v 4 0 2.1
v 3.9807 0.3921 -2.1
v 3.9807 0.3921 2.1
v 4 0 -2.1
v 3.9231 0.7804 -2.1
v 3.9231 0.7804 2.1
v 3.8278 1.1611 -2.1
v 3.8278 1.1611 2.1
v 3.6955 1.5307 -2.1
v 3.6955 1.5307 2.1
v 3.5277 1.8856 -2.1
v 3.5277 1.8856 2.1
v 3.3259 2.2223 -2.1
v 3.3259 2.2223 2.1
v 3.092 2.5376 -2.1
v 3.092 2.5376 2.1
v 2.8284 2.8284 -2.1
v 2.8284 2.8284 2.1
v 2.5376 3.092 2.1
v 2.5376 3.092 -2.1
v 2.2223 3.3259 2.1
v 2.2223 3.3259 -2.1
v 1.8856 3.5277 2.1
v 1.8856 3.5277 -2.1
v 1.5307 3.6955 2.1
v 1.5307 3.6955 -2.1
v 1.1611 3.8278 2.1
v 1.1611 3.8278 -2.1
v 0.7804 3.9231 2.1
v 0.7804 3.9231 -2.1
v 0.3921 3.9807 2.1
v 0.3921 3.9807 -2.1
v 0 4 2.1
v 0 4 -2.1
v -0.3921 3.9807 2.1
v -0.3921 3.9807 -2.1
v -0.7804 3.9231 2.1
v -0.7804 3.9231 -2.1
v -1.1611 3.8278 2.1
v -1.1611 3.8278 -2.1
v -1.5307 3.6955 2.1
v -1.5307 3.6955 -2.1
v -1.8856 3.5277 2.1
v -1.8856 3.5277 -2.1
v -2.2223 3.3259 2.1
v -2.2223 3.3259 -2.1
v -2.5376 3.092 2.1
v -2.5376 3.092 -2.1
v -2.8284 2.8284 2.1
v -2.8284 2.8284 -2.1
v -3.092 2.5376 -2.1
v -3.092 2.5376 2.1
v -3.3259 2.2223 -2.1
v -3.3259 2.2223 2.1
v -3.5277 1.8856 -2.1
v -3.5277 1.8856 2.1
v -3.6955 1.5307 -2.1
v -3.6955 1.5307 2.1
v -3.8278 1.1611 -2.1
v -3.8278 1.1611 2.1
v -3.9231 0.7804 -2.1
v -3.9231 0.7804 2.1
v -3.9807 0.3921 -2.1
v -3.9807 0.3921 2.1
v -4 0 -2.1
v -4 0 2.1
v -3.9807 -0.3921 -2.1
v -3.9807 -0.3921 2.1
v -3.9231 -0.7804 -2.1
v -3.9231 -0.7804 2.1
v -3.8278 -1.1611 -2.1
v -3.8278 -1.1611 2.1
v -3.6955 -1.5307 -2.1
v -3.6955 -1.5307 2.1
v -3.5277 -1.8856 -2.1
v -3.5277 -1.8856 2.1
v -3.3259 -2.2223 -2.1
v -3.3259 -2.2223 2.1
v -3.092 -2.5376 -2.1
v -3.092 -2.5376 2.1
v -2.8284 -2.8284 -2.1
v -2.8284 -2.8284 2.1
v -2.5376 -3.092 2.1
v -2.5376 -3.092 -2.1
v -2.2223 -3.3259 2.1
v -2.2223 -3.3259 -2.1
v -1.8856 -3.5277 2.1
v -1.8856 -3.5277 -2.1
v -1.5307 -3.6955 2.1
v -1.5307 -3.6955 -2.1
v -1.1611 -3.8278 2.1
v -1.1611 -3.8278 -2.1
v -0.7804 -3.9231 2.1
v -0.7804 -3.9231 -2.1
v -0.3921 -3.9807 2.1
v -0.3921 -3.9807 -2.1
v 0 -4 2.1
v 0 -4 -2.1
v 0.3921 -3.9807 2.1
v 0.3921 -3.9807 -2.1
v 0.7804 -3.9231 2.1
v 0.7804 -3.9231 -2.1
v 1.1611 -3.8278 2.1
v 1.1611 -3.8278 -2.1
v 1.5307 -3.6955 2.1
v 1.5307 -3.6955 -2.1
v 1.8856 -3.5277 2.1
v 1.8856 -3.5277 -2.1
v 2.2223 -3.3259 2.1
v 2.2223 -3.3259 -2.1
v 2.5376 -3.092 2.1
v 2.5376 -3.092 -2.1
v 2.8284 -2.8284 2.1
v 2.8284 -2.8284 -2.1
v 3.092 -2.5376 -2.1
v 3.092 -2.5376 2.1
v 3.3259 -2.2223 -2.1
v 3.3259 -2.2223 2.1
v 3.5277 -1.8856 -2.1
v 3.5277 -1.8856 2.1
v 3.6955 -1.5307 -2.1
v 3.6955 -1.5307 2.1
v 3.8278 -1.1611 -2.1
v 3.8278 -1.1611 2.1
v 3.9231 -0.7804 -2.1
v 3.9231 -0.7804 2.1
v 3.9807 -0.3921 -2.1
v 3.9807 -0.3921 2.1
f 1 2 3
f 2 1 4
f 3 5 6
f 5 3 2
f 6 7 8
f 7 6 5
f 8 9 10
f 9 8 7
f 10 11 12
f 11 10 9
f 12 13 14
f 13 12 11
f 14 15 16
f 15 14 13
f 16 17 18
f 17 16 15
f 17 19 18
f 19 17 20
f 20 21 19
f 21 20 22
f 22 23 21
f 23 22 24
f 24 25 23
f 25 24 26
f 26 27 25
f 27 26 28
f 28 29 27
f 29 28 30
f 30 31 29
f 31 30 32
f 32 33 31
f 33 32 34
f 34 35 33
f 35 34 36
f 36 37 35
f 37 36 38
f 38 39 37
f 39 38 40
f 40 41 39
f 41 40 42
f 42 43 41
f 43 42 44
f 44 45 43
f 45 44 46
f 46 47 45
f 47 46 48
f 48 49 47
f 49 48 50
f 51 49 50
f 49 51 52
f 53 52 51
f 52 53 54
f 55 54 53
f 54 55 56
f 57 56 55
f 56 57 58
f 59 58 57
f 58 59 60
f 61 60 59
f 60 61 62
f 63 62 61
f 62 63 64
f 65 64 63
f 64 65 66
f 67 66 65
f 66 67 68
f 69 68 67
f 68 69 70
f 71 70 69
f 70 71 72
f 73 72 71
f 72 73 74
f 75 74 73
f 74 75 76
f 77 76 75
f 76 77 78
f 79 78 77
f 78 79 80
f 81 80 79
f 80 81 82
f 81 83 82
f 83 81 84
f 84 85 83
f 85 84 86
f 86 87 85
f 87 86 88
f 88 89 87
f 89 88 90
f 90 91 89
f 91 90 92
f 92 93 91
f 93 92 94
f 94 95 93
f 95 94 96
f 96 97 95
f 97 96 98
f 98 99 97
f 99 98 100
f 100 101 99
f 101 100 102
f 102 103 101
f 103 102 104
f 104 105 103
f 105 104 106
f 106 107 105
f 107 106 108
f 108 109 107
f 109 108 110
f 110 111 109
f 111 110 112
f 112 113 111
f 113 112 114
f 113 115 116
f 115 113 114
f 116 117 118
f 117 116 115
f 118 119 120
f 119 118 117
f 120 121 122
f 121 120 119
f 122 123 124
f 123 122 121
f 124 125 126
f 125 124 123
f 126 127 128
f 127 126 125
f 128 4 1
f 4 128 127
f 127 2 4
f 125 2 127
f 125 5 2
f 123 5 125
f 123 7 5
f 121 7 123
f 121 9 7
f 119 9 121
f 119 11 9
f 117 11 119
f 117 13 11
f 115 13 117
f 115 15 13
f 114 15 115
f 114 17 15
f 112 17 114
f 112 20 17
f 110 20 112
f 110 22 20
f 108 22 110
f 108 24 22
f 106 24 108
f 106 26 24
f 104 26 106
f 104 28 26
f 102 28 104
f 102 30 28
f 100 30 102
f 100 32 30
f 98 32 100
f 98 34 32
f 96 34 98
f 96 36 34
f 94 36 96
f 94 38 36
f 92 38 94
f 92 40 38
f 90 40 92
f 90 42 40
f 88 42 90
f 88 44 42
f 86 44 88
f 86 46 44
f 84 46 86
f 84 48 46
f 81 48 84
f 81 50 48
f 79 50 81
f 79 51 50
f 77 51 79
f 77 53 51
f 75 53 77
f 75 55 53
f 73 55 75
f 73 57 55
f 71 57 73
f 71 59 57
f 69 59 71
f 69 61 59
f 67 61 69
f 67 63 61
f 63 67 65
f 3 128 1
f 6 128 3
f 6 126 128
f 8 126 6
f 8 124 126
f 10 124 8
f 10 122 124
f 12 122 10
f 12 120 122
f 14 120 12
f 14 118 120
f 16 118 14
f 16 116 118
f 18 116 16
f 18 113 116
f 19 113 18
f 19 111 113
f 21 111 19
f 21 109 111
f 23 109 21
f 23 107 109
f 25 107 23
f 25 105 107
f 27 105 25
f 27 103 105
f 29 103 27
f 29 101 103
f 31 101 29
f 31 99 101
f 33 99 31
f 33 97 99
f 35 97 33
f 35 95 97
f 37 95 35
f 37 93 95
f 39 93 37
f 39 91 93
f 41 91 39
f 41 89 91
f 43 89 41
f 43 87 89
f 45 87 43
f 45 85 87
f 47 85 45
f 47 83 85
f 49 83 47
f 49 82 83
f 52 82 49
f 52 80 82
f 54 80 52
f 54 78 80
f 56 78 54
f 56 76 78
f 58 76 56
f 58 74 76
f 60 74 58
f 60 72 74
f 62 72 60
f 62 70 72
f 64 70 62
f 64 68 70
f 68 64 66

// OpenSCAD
// Parameters
outer_diameter_mm = 8.0; //[4.0:16.0:0.1]
height_mm = 4.2; //[2.1:8.4:0.1]

// Magnet - complete geometry
module magnet() {
  color([0.72, 0.45, 0.2]) { // Copper-like color for magnet
    // Magnet body
    translate([0, 0, 0])
      cylinder(r=outer_diameter_mm/2, h=height_mm, center=true, $fn=64);
  }
}

// Assembly
module assembly() {
  magnet();
}

assembly();
